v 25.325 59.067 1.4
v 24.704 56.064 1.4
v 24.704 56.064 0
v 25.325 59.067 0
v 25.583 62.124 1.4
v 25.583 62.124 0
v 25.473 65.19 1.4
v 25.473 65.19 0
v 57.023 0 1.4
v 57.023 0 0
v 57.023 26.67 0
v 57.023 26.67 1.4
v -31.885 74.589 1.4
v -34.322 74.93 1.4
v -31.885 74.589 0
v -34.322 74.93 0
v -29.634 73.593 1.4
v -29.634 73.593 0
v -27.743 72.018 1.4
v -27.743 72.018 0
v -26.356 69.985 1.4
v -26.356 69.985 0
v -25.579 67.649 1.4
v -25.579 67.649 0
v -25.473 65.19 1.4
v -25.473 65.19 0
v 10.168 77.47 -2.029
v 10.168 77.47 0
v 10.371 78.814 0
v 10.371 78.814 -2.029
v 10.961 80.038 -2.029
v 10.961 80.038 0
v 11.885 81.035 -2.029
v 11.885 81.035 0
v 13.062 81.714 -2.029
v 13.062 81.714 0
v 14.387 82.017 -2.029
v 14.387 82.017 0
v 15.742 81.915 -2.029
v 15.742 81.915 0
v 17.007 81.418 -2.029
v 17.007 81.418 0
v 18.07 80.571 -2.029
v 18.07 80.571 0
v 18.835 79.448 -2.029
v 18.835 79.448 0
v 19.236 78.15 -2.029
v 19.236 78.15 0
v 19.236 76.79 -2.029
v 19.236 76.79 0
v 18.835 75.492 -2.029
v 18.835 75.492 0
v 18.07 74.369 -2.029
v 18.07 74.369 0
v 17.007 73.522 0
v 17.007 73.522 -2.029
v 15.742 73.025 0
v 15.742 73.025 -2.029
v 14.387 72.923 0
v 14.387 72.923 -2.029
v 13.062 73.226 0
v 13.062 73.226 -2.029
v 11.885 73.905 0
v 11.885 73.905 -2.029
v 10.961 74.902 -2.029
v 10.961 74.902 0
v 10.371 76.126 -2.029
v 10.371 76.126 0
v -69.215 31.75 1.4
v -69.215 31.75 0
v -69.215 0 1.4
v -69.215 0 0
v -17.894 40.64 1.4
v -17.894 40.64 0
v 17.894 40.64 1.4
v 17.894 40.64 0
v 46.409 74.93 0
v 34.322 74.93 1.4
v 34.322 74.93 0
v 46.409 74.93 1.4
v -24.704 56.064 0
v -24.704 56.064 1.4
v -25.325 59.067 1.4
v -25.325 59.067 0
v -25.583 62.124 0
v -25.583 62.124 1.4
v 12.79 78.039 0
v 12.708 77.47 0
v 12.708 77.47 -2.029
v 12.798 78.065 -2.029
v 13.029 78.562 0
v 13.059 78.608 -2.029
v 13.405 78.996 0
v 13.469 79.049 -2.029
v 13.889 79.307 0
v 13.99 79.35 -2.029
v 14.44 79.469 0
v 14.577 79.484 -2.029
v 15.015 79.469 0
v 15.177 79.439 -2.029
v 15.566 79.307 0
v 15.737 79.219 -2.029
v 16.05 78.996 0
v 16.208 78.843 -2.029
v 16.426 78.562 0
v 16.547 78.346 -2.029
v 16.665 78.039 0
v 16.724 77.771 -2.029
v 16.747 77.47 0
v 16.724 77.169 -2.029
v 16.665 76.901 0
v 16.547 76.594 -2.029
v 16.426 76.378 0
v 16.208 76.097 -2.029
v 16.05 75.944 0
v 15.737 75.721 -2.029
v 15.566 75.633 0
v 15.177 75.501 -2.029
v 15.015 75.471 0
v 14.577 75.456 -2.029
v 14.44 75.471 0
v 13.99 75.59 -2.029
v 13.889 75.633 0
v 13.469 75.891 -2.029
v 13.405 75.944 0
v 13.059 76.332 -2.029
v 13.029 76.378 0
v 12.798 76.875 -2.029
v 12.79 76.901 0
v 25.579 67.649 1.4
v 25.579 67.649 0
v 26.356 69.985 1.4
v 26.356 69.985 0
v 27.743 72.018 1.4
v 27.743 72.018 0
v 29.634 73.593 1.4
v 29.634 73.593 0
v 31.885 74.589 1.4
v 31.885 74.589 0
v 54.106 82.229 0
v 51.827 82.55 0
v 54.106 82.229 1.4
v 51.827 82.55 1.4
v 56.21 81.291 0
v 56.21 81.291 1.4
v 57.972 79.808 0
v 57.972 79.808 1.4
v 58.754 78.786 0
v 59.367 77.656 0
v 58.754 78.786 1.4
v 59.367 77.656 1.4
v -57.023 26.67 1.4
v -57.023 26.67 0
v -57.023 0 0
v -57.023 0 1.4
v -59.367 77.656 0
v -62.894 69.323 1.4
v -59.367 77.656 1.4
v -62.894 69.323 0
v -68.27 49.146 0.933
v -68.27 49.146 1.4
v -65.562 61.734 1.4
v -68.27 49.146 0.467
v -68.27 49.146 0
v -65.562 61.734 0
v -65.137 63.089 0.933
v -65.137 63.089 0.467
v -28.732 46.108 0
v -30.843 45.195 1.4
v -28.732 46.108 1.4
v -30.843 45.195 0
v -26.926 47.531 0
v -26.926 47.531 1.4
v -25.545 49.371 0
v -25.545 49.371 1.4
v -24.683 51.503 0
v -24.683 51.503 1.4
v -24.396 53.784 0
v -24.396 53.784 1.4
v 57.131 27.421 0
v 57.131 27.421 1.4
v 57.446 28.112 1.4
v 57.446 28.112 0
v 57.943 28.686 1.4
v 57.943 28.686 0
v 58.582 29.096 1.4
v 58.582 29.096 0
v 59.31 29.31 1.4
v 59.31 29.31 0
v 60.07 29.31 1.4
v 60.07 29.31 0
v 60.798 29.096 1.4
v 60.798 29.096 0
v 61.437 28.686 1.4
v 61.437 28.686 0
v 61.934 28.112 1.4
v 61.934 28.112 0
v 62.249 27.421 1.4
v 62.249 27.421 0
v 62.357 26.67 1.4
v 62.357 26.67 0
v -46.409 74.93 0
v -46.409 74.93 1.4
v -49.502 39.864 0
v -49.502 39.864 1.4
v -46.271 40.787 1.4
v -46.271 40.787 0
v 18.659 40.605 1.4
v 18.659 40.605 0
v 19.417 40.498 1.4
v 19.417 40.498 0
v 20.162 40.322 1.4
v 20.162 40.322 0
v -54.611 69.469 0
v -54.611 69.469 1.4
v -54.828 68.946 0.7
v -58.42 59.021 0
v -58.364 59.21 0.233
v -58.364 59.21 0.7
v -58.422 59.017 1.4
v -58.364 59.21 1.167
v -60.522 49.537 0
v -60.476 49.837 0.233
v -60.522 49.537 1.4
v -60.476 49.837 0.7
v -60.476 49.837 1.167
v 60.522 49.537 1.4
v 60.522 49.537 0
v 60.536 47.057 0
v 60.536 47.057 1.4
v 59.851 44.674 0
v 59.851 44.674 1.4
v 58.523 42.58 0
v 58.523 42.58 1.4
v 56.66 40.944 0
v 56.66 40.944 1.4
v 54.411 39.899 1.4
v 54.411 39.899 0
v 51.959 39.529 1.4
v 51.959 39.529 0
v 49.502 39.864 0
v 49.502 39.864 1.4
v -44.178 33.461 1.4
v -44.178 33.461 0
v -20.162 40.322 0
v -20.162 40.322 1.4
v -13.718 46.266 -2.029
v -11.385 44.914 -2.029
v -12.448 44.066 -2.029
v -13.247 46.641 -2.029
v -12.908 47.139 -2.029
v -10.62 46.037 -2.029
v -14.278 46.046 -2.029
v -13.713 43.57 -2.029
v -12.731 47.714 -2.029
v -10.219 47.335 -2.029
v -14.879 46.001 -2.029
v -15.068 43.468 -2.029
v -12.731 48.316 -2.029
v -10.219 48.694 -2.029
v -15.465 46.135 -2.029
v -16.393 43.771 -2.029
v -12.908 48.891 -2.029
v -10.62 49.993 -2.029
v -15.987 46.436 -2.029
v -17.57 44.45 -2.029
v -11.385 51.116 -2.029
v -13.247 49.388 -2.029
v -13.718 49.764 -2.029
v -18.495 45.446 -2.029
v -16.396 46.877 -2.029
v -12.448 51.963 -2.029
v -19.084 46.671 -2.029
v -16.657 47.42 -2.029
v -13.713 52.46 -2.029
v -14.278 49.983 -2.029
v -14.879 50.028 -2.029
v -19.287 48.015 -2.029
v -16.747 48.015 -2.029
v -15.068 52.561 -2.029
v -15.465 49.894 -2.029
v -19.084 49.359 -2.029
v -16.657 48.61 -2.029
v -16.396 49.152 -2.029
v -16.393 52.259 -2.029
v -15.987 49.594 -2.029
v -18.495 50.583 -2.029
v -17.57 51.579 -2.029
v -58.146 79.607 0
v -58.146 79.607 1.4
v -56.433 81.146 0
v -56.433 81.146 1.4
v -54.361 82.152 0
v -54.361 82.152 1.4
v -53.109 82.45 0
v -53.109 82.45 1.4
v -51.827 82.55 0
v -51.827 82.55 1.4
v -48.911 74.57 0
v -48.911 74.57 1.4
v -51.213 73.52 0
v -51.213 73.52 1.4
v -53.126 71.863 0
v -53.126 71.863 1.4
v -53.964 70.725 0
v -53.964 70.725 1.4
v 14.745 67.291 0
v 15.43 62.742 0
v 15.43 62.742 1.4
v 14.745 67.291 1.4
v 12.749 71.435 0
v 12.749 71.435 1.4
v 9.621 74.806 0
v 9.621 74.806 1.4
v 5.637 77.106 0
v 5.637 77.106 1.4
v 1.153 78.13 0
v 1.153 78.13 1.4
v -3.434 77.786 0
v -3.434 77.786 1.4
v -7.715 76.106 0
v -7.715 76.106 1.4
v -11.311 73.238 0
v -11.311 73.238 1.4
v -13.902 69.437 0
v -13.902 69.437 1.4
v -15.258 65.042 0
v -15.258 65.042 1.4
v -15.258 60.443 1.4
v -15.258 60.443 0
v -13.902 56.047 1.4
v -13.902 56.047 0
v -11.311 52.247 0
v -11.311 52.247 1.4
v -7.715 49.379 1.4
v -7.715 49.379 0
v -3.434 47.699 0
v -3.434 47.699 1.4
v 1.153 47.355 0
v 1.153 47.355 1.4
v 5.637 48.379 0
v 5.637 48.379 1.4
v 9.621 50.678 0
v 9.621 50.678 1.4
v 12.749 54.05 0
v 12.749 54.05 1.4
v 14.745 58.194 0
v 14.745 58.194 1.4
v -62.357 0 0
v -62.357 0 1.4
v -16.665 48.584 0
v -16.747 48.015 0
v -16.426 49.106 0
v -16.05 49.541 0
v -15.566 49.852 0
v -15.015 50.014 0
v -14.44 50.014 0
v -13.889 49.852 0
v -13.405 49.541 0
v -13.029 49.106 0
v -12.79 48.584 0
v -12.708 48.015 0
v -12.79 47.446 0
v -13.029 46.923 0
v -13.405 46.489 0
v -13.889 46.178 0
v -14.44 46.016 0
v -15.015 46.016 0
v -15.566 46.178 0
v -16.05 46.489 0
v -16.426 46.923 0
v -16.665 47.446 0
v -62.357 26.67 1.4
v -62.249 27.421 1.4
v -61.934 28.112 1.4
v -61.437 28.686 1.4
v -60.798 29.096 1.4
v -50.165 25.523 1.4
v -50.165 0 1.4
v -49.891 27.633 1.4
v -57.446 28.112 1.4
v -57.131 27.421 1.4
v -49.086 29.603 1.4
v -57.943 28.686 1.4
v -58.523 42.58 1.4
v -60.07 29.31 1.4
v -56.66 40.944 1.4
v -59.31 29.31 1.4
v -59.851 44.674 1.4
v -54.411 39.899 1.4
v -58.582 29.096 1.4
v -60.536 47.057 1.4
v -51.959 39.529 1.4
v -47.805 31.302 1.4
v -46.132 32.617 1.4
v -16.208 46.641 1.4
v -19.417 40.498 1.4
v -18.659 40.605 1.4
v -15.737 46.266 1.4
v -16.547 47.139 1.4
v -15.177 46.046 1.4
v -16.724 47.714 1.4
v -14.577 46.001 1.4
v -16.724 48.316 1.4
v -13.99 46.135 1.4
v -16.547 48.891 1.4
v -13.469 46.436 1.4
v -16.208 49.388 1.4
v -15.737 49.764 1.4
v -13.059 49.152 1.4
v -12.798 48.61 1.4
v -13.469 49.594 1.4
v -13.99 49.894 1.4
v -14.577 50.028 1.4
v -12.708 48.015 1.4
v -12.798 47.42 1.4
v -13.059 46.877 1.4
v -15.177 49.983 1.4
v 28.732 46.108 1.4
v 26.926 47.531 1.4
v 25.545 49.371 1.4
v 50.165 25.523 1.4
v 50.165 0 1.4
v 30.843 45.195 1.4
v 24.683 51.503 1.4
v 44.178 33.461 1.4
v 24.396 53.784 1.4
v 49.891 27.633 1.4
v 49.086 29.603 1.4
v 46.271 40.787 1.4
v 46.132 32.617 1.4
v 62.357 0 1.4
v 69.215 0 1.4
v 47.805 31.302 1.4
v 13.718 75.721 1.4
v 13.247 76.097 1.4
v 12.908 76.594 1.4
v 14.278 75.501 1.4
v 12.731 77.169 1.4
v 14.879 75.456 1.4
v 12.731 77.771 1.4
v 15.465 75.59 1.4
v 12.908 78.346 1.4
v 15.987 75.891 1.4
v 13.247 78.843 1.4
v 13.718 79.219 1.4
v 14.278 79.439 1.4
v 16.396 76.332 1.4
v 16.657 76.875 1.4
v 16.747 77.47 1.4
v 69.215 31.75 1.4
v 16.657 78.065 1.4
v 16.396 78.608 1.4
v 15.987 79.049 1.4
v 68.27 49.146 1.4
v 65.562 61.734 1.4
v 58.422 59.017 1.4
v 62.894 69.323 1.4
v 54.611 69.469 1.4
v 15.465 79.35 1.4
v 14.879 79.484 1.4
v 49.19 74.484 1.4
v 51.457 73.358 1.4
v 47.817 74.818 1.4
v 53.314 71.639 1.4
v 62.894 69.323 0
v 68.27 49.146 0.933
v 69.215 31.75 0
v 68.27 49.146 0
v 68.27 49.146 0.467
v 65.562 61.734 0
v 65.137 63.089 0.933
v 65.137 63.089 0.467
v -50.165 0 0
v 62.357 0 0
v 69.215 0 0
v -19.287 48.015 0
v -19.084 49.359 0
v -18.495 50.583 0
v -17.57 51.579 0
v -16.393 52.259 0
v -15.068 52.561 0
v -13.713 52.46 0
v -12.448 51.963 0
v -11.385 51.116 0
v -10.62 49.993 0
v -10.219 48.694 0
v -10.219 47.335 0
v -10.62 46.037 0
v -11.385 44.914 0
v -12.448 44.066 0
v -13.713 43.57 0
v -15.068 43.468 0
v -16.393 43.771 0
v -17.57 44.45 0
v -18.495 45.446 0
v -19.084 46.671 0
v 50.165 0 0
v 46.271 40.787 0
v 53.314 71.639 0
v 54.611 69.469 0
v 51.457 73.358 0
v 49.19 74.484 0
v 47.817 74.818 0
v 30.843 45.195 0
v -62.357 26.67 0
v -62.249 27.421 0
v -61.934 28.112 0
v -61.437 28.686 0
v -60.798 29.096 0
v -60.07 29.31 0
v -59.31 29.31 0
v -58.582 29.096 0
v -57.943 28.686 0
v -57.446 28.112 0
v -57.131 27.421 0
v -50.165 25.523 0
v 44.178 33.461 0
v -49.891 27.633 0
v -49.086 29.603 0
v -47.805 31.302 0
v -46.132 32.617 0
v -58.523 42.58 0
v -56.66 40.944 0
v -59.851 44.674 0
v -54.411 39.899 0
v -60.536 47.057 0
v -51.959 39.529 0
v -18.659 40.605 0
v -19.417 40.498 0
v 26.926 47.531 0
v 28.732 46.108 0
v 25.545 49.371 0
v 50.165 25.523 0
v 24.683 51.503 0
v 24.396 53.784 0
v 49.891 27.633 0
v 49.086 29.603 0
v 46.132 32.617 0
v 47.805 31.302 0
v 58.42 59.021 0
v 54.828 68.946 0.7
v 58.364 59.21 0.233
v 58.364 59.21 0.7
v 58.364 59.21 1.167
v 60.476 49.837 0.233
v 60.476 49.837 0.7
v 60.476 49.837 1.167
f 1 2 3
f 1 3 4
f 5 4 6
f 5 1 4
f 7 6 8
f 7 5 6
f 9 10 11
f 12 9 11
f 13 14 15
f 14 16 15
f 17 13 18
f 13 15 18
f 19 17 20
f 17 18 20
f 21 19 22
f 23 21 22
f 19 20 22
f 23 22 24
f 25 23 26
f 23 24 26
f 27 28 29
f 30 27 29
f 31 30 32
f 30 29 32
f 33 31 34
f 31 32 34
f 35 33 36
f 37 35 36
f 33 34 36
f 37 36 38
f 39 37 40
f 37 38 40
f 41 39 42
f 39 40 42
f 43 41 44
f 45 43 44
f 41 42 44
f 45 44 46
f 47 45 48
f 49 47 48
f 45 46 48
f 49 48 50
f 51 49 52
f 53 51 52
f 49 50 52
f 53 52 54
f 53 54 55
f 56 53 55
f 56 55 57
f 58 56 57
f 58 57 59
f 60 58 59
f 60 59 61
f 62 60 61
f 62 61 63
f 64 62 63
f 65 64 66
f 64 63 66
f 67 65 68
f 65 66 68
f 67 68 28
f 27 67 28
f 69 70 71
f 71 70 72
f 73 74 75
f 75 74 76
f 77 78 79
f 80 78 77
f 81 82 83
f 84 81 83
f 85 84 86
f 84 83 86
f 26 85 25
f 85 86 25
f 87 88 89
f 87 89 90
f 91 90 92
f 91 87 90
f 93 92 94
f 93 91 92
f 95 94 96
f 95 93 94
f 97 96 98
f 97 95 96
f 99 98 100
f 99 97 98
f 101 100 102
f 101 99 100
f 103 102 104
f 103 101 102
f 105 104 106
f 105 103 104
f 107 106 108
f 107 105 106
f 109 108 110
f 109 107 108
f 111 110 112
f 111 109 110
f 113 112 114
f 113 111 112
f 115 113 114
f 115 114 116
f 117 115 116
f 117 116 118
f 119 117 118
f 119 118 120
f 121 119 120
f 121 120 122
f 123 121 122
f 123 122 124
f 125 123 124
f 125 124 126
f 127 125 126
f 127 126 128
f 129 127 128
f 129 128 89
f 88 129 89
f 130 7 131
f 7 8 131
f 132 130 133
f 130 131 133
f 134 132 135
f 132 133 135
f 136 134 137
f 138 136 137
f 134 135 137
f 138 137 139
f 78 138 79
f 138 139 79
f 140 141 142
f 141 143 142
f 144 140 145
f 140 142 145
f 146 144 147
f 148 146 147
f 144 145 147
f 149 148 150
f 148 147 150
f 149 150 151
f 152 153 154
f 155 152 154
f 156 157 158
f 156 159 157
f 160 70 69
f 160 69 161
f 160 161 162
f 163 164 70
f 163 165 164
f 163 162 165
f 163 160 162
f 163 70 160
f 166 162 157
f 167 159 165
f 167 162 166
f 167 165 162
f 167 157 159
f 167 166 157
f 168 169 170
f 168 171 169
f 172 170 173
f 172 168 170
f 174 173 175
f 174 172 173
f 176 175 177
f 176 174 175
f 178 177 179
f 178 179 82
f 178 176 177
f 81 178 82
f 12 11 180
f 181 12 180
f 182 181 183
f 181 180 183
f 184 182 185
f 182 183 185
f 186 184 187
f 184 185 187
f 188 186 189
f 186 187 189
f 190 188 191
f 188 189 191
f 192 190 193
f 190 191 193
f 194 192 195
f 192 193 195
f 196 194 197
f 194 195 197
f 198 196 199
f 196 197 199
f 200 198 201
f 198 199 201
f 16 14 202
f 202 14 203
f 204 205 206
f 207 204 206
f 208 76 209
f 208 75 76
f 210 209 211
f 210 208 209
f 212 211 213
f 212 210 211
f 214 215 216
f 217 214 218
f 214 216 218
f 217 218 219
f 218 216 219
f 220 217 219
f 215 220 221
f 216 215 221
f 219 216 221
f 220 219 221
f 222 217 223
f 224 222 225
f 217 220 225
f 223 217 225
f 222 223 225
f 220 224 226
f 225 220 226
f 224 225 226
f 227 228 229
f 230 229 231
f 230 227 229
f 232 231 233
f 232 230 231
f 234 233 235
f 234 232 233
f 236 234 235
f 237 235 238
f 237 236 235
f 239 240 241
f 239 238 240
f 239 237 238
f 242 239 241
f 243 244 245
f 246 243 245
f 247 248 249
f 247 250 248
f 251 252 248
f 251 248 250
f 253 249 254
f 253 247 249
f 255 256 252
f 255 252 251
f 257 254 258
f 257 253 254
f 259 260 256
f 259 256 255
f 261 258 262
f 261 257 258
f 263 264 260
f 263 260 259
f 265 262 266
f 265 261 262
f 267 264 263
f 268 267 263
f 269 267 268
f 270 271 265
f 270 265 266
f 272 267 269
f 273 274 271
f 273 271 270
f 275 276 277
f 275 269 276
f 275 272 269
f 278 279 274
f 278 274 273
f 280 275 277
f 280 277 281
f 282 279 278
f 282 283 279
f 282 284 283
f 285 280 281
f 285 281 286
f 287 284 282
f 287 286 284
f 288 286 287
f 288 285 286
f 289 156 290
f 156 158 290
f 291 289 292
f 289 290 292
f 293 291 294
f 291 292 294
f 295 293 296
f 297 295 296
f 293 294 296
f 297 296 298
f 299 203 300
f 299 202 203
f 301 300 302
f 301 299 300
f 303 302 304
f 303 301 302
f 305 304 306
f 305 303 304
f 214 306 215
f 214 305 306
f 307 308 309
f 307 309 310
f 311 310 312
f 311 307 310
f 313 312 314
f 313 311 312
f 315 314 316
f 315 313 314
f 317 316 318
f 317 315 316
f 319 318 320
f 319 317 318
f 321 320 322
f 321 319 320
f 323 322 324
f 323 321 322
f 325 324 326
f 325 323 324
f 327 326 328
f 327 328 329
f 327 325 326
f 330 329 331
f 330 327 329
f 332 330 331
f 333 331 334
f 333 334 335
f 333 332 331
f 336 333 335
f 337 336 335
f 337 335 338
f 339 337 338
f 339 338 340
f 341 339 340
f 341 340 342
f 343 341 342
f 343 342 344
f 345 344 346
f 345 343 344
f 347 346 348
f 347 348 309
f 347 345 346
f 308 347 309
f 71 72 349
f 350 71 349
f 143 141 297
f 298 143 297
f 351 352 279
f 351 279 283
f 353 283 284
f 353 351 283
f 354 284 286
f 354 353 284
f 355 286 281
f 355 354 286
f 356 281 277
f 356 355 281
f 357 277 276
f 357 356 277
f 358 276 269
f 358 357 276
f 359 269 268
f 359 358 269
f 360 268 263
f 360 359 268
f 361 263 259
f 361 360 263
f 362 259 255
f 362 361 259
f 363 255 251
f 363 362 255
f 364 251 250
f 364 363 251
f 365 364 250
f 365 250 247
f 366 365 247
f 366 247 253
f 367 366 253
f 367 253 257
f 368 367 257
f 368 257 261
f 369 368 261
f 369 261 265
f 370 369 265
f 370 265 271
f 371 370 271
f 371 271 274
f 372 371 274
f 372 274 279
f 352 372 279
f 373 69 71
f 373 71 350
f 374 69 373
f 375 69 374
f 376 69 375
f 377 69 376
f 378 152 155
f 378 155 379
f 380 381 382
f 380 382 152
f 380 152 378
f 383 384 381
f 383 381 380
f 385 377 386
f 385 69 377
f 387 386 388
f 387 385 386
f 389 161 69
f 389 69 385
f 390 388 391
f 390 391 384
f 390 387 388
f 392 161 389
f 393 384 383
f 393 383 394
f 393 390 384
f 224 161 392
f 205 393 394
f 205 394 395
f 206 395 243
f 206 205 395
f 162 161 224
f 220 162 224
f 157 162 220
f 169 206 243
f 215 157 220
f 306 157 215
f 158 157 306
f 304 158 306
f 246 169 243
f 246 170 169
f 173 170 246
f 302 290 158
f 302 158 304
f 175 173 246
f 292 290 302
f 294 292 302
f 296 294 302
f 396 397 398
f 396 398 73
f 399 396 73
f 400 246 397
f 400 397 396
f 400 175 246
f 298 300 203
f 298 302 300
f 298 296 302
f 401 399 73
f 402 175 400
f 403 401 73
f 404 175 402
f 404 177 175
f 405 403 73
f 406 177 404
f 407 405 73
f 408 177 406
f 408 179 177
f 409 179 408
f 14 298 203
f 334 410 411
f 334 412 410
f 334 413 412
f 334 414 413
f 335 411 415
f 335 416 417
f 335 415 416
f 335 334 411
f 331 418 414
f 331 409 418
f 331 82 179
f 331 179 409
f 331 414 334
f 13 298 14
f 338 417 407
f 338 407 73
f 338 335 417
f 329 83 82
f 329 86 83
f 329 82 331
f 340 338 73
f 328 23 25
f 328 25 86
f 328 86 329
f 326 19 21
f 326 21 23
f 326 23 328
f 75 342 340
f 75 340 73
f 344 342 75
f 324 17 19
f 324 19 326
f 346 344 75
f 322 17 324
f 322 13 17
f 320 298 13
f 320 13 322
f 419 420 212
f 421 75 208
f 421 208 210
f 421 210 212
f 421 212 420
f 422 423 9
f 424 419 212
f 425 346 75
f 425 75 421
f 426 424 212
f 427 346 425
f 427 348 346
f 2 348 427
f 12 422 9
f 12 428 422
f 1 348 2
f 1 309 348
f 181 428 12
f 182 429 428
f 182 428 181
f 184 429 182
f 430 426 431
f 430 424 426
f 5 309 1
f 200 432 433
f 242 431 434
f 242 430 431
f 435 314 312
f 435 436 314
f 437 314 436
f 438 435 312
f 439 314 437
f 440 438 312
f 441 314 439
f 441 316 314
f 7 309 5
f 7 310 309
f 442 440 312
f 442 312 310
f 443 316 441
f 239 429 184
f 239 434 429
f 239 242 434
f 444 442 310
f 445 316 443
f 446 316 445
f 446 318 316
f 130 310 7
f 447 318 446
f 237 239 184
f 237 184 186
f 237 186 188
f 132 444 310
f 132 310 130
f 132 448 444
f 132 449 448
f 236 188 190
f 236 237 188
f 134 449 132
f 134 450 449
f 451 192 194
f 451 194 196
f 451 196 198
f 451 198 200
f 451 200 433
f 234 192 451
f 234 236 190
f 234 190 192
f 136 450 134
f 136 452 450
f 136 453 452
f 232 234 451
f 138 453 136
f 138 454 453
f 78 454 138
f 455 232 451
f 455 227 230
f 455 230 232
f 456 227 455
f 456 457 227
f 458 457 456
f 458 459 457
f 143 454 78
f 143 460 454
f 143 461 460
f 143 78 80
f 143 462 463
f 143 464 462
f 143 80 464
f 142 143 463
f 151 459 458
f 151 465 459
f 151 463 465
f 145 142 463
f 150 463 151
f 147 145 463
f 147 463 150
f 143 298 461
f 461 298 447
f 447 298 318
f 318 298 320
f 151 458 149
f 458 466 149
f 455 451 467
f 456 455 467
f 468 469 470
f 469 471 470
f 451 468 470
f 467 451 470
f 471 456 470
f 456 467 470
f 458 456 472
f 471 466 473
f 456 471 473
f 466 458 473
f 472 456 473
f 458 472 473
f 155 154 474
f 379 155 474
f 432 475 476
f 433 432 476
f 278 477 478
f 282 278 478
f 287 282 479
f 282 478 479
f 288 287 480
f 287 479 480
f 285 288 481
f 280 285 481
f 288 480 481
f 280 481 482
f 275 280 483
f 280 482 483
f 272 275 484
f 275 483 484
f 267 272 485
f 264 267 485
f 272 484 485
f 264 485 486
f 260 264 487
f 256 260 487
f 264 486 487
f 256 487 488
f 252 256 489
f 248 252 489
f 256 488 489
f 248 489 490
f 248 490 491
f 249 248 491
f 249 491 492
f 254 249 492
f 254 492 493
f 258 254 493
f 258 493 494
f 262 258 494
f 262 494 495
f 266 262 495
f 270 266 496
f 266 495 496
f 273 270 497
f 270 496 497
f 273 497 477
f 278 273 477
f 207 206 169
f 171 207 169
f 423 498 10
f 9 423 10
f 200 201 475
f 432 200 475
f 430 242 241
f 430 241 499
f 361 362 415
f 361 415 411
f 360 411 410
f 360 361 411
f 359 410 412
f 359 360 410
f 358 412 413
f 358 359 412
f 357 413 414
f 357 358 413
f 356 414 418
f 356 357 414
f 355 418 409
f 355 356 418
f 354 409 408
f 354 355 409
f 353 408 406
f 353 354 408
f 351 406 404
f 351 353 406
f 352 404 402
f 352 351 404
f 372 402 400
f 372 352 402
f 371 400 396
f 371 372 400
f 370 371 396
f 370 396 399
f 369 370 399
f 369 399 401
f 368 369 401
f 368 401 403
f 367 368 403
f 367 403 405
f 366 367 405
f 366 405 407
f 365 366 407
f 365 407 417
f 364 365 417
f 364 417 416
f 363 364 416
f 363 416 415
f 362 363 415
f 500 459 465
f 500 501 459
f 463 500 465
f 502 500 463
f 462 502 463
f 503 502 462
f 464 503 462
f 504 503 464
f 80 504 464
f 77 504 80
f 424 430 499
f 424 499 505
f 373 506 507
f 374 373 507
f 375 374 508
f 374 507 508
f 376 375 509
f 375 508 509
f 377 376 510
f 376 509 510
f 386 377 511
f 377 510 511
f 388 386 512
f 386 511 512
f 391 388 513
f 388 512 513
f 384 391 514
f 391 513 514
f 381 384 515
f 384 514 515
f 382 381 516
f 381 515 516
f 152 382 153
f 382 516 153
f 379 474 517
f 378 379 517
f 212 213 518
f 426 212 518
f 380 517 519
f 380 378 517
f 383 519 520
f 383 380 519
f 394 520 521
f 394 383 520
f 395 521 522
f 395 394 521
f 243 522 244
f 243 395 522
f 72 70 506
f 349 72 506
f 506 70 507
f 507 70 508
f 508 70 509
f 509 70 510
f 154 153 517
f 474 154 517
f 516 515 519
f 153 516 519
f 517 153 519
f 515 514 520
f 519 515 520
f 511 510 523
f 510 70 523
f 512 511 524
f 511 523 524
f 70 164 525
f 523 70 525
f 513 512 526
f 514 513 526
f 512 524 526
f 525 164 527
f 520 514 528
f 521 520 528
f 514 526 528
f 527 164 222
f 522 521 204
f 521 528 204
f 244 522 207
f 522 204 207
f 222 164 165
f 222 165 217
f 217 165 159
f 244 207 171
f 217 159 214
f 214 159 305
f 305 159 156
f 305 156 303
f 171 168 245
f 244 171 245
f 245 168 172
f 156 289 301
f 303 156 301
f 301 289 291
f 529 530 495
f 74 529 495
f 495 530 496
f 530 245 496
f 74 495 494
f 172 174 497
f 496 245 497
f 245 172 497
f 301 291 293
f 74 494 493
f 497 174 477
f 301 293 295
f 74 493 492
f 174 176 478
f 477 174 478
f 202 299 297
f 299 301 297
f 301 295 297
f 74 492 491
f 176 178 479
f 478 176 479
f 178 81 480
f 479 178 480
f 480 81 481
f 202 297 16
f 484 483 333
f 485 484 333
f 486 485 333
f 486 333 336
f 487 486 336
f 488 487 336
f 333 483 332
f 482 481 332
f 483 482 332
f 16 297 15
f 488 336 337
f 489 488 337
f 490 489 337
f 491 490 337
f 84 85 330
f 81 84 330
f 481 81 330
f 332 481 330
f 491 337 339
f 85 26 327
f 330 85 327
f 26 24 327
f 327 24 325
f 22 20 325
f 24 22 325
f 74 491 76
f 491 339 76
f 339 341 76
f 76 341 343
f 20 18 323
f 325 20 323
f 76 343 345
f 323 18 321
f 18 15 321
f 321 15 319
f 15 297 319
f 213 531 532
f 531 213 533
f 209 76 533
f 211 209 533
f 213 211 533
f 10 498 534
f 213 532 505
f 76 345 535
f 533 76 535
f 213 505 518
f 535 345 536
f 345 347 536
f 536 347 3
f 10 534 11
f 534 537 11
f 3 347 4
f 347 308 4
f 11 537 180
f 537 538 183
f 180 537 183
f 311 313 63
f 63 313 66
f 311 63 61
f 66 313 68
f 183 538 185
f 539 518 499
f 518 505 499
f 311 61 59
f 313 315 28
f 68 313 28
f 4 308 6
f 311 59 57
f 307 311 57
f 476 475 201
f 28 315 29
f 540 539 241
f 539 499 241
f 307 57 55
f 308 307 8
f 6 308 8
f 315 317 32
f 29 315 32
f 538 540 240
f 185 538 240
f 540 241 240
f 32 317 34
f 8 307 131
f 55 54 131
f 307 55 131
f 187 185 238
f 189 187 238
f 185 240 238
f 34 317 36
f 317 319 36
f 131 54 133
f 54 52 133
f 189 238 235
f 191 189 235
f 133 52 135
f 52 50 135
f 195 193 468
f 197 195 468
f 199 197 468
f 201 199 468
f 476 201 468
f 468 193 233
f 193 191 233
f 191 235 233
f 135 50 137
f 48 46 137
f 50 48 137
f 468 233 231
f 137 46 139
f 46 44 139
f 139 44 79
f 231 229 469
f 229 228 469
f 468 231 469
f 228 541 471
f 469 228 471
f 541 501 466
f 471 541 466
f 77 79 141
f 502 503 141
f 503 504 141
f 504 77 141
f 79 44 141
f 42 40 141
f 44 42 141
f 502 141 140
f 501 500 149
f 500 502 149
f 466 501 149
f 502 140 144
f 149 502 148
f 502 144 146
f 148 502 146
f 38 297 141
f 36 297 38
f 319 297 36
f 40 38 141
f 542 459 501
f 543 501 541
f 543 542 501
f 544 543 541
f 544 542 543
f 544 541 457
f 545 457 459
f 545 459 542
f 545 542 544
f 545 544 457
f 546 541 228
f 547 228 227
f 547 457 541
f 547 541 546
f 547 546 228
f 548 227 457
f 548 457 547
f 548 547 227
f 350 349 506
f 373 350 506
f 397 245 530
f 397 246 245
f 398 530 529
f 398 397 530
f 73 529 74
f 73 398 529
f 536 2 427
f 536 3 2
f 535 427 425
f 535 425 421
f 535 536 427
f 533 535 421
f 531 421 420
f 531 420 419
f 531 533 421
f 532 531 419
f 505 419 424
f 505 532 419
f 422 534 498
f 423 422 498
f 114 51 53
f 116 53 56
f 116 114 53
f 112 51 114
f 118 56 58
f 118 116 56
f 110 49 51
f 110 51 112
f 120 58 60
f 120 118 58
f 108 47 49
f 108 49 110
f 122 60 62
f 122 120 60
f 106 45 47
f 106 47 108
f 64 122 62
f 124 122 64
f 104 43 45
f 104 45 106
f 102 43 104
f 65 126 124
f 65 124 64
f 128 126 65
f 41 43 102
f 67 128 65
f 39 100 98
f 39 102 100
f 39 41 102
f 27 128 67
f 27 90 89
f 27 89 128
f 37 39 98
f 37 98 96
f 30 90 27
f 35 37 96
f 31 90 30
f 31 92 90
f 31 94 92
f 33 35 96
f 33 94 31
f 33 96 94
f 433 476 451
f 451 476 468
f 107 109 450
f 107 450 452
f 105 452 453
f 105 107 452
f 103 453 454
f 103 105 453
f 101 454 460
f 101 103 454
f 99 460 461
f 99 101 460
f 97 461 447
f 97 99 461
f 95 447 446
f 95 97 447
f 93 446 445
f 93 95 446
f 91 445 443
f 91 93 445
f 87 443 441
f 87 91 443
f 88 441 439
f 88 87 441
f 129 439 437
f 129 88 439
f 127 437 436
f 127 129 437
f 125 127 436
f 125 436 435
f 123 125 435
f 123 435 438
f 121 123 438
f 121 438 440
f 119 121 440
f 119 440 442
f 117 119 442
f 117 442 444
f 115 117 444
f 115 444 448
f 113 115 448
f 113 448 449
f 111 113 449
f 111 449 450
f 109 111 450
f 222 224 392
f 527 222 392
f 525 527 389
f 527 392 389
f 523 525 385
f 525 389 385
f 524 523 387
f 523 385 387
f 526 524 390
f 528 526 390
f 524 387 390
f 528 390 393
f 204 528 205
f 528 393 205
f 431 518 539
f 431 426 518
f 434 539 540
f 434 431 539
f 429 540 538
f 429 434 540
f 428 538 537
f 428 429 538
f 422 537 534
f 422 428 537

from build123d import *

# Parameters (mm, degrees)
SKETCH2_R            = 15.4305
SKETCH2_R_2          = 2.0193
BOSS_EXTRUDE1_DEPTH  = 1.4
FILLET4_R            = 8.255
CUT_EXTRUDE1_DEPTH   = 2.4000001
FILLET5_R            = 8.89
FILLET5_OF_MIRROR1_R = 8.89
SKETCH8_R            = 4.5593
SKETCH8_R_2          = 2.0193
BOSS_EXTRUDE2_DEPTH  = 2.029


with BuildPart() as part:
    # Sketch2 → Boss-Extrude1 (new body)
    with BuildSketch(Plane.XY):
        with BuildLine():
            Line((-69.215, 12.7), (-69.215, 0))
            Line((-69.215, 0), (-62.357, 0))
            Line((-62.357, 0), (-62.357, 26.67))
            ThreePointArc((-62.357, 26.67), (-59.69, 29.337), (-57.023, 26.67))
            Line((-57.023, 26.67), (-57.023, 0))
            Line((-57.023, 0), (-50.165, 0))
            Line((-50.165, 0), (-50.165, 31.75))
            Line((-50.165, 31.75), (-19.05, 40.64))
            Line((-19.05, 40.64), (0, 40.64))
            Line((0, 40.64), (19.05, 40.64))
            Line((19.05, 40.64), (50.165, 31.75))
            Line((50.165, 31.75), (50.165, 0))
            Line((50.165, 0), (57.023, 0))
            Line((57.023, 0), (57.023, 26.67))
            ThreePointArc((57.023, 26.67), (59.69, 29.337), (62.357, 26.67))
            Line((62.357, 26.67), (62.357, 0))
            Line((62.357, 0), (69.215, 0))
            Line((69.215, 0), (69.215, 12.7))
            Line((69.215, 12.7), (69.215, 31.75))
            add(Edge.make_bspline(
                [(69.215, 31.75), (69.215, 54.201663529), (66.080158446, 63.077253183), (57.15, 82.55)],
                knots=[0, 0, 0, 0, 1, 1, 1, 1], degree=3))
            Line((57.15, 82.55), (-57.15, 82.55))
            add(Edge.make_bspline(
                [(-69.215, 31.75), (-69.215, 54.201663529), (-66.080158446, 63.077253183), (-57.15, 82.55)],
                knots=[0, 0, 0, 0, 1, 1, 1, 1], degree=3))
            Line((-69.215, 31.75), (-69.215, 12.7))
        make_face()
        with Locations((0, 62.742379961)):
            Circle(SKETCH2_R, mode=Mode.SUBTRACT)
        with Locations((-14.727620039, 48.014759923)):
            Circle(SKETCH2_R_2, mode=Mode.SUBTRACT)
        with Locations((14.727620039, 77.47)):
            Circle(SKETCH2_R_2, mode=Mode.SUBTRACT)
    extrude(amount=BOSS_EXTRUDE1_DEPTH)

    # Fillet4
    fillet4_edges = [part.edges().sort_by_distance(p)[0] for p in [
        (57.15, 82.55, 0.7),
        (-57.15, 82.55, 0.7),
        (50.165, 31.75, 0.7),
        (19.05, 40.64, 0.7),
        (-19.05, 40.64, 0.7),
        (-50.165, 31.75, 0.7),
    ]]
    fillet(fillet4_edges, radius=FILLET4_R)

    # Sketch7 → Cut-Extrude1 (cut, through all)
    with BuildSketch(Plane.XY.offset(1.4)):
        with BuildLine():
            Line((-22.501902321, 74.93), (-51.827314967, 74.93))
            Line((-51.827314967, 74.93), (-52.239495321, 74.93))
            Line((-52.239495321, 74.93), (-52.407305567, 74.553526409))
            add(Edge.make_bspline(
                [(-52.407305567, 74.553526409), (-53.292419845, 72.567818402), (-54.098016837, 70.709360728), (-55.558646263, 67.181996285), (-56.213641355, 65.513276159), (-57.386849267, 62.293765878), (-57.905181999, 60.743063744), (-58.823443884, 57.676179523), (-59.223597116, 56.159796082), (-59.922846669, 53.067471662), (-60.222031529, 51.491149103), (-60.491375272, 49.737636417), (-60.506543886, 49.637526891), (-60.521547991, 49.537125261)],
                knots=[0, 0, 0, 0, 0.125, 0.125, 0.25, 0.25, 0.375, 0.375, 0.5, 0.5, 0.625, 0.625, 0.632545784, 0.632545784, 0.632545784, 0.632545784], degree=3))
            ThreePointArc((-60.521547991, 49.537125261), (-57.650036676, 41.695346124), (-49.50226085, 39.864273665))
            Line((-49.50226085, 39.864273665), (-46.271197905, 40.787434507))
            Line((-46.271197905, 40.787434507), (-20.935753267, 48.026132975))
            ThreePointArc((-20.935753267, 48.026132975), (-25.547250262, 61.255203349), (-22.501902321, 74.93))
        make_face()
    cut_extrude1 = extrude(amount=-CUT_EXTRUDE1_DEPTH, mode=Mode.SUBTRACT)

    # Fillet5
    fillet5_edges = [part.edges().sort_by_distance(p)[0] for p in [
        (-22.501902321, 74.93, 0.7),
        (-52.239495321, 74.93, 0.7),
        (-20.935753267, 48.026132975, 0.7),
    ]]
    fillet(fillet5_edges, radius=FILLET5_R)

    # Mirror1: Cut-Extrude1 across plane
    add(cut_extrude1.mirror(Plane(origin=(0, 0, 0), x_dir=(0, 0, 1), z_dir=(1, 0, 0))), mode=Mode.SUBTRACT)

    # Fillet5 of Mirror1
    fillet5_of_mirror1_edges = [part.edges().sort_by_distance(p)[0] for p in [
        (22.501902321, 74.93, 0.7),
        (52.239495321, 74.93, 0.7),
        (20.935753267, 48.026132975, 0.7),
    ]]
    fillet(fillet5_of_mirror1_edges, radius=FILLET5_OF_MIRROR1_R)

    # Sketch8 → Boss-Extrude2 (add)
    with BuildSketch(Plane(origin=(0, 0, 0), x_dir=(-1, 0, 0), z_dir=(0, 0, -1))):
        with Locations((-14.727620039, 77.47)):
            Circle(SKETCH8_R)
        with Locations((-14.727620039, 77.47)):
            Circle(SKETCH8_R_2, mode=Mode.SUBTRACT)
        with Locations((14.727620039, 48.014759923)):
            Circle(SKETCH8_R)
        with Locations((14.727620039, 48.014759923)):
            Circle(SKETCH8_R_2, mode=Mode.SUBTRACT)
    extrude(amount=BOSS_EXTRUDE2_DEPTH)


solid = part.part
